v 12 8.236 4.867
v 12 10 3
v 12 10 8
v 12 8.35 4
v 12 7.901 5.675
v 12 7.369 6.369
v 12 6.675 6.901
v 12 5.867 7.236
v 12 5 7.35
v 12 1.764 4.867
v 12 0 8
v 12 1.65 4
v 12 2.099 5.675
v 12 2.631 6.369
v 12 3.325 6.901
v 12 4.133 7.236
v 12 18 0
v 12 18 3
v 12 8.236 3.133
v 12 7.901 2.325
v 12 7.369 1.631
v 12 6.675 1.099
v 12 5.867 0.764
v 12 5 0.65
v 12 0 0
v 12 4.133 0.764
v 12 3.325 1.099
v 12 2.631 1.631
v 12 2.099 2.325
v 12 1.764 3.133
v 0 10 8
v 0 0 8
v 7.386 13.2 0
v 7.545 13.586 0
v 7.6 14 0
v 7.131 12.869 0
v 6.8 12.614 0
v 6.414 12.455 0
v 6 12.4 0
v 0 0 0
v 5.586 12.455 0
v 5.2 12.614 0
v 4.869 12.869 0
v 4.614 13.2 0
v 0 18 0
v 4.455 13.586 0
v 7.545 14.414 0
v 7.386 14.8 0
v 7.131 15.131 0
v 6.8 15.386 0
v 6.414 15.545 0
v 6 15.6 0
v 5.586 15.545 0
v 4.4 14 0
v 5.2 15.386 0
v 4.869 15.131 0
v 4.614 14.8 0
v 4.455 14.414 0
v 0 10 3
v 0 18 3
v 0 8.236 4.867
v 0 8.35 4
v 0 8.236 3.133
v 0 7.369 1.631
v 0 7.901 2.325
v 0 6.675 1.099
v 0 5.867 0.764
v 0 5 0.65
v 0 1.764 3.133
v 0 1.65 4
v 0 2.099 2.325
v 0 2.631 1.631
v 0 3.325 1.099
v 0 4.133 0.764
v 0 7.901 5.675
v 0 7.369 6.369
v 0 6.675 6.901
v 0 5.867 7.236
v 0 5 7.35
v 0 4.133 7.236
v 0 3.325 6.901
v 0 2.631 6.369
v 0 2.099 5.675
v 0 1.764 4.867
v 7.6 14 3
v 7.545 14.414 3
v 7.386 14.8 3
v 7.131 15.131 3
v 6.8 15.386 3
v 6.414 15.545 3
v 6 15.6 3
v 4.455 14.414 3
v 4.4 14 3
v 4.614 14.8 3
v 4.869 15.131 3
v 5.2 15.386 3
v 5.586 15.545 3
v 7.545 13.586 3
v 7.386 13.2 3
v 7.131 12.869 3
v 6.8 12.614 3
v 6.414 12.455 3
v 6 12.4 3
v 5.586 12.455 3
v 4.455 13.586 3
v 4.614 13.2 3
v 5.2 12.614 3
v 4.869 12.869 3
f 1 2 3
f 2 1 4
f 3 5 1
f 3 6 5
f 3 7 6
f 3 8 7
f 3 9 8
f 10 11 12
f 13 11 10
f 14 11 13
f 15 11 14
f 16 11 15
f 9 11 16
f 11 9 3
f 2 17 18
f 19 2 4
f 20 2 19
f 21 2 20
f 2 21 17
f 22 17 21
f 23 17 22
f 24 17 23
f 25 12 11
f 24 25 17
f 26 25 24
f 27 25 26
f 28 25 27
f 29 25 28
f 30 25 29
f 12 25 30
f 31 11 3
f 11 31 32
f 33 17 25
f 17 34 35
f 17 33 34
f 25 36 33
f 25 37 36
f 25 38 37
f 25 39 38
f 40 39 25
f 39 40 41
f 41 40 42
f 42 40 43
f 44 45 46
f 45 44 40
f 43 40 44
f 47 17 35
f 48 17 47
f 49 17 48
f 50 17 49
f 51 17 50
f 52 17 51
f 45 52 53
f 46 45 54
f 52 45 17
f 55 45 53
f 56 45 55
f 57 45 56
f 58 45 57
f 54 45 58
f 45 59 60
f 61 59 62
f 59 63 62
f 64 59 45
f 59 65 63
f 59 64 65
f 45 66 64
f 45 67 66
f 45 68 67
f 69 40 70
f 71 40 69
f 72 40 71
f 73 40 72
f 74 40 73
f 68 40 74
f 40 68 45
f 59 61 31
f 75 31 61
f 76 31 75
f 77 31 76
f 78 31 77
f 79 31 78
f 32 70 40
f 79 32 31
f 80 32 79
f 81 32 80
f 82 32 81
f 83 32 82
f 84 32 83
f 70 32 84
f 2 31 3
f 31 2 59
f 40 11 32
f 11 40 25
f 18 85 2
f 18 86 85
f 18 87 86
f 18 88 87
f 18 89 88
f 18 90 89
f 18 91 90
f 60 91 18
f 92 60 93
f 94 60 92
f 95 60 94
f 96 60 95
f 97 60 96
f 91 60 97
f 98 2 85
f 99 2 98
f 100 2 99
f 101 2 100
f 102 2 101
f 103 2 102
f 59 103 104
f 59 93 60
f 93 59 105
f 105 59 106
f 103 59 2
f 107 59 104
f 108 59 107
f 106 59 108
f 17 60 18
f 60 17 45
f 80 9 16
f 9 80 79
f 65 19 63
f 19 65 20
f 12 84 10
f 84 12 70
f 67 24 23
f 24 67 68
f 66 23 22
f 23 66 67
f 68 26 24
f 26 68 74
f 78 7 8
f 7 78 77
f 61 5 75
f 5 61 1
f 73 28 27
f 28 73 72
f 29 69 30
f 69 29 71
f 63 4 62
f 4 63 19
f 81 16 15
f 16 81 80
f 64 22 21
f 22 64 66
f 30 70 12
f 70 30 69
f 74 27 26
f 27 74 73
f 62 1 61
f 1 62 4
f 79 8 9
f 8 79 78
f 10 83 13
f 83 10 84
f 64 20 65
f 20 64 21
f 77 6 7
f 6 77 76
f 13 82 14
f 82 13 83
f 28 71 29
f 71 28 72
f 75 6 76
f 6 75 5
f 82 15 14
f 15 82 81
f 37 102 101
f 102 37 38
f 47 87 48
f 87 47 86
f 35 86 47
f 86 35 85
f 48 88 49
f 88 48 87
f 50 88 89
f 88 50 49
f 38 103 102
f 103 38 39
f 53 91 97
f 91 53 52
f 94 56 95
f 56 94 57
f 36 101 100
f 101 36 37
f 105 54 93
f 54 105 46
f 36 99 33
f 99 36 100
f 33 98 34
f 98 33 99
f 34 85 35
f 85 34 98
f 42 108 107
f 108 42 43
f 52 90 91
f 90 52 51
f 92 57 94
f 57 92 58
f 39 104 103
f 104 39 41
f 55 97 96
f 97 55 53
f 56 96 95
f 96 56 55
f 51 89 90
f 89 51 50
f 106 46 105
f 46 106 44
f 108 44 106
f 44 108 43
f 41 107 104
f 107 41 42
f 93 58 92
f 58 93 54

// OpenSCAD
// file: rack_params.scad
// 推出模块共享参数 - 所有零件文件和装配预览文件通过 include 引用此文件
// 此文件仅放参数定义（变量赋值），不放任何 geometry 语句

// ---------- 底板参数 (引用自 sliding_track_base.scad) ----------
base_w   = 30;
base_l   = 90;
base_t   = 5;
groove_w = 26;
groove_d = 1.5;

// ---------- 齿条参数 ----------
modulus     = 1.0;                    // 齿轮模数
pitch       = PI * modulus;           // 齿距 p
addendum    = 1.0 * modulus;          // 齿顶高
dedendum    = 1.2 * modulus;          // 齿根高
tooth_thick = pitch / 2;              // 齿厚

rack_w     = 8;                       // 齿条宽 (X)
rack_thick = 3.5;                     // 齿条厚 (Z) - 仅含齿高部分（与齿轮啮合计算用）
rack_base_h = 5;                      // 齿条基体加厚高度（专门为底部粘贴预留），不含齿高
rack_len   = 140;                     // 齿条长 (Y) — 由原 70mm 改为 140mm
tooth_cnt  = floor(rack_len / pitch); // 齿条齿数

// ---------- 推头参数 ----------
pusher_w     = 23;                    // 推头宽 (< groove_w=26)
pusher_tab_t = 1.5;                   // 竖板厚 (< groove_d=1.5)
pusher_arm_t = 1.5;                   // 横板厚
blocker_h    = 20;                    // 竖板总高度（从齿条顶面起算）= 底板厚(5) + 药盒高(13.5) + 余量(1.5)
                                     //  作用：推头到达行程终点时高出底板 15mm 堵住上方药匣出药口

// ---------- 齿轮参数 ----------
gear_teeth   = 20;                    // 齿轮齿数
gear_r       = gear_teeth * modulus / 2;   // 分度圆半径
gear_outer_r = gear_r + addendum;          // 齿顶圆半径
gear_root_r  = gear_r - dedendum;          // 齿根圆半径
gear_w       = rack_w;                     // 齿轮厚度 (Z)
shaft_d      = 6.5;                         // 电机轴径（6.5mm 轴孔）
shaft_len    = 20;                         // 轴长

// ---------- 轴座参数 ----------
bearing_block_w = 12;
bearing_block_d = 10;
bearing_block_h = 8;
bearing_hole_d  = 6.7;                     // 6.5mm电机轴 + 0.2mm间隙
mount_hole_d    = 3.2;                     // M3 安装孔

// ---------- 装配坐标 ----------
rack_x   = (base_w - rack_w) / 2;         // 齿条X起点 (底板X中心)
rack_z   = -rack_thick;                   // 齿条Z底面 (底板Z=0下方)
rack_y0  = -20;                           // 齿条Y起点 (在底板Y=0外)

gear_cx = base_w / 2;                     // 齿轮X中心
gear_cy = base_l - 5;                     // 齿轮Y中心 (底板Y=90末端内侧)
gear_cz = rack_z + rack_thick / 2;        // 齿轮Z中心 (齿条厚度中线)

bearing_y   = gear_cy;                    // 轴座Y中心
mount_inset = 5;
eps         = 0.01;
// main file
// bearing_block.scad - 6.5mm 电机轴的轴座
// 局部坐标系：左下前角为 (0,0,0)
// 包含：12×10×8 主块 + L 形加强脚 + Φ6.7 轴孔（沿 X 方向水平穿过）+ M3 沉头安装孔

include <rack_params.scad>

module bearing_block() {
    color("SlateGray")
    difference() {
        union() {
            // 主块
            cube([bearing_block_w, bearing_block_d, bearing_block_h]);
            // L 形加强脚（向 Y 方向延伸，用于螺丝固定到底板）
            cube([bearing_block_w, bearing_block_d + 8, 3]);
        }
        // 水平轴孔（沿 X 方向穿过主块中心，6.7mm = 6.5mm 轴 + 0.2mm 间隙）
        translate([-eps, bearing_block_d / 2, bearing_block_h / 2])
            rotate([0, 90, 0])
                cylinder(h = bearing_block_w + 2 * eps, r = bearing_hole_d / 2, $fn = 24);
        // M3 沉头安装孔（向下贯穿 L 形脚）
        translate([bearing_block_w / 2, bearing_block_d + 4, -eps])
            cylinder(h = 3 + 2 * eps, r = mount_hole_d / 2, $fn = 24);
    }
}

// 独立渲染
bearing_block();
